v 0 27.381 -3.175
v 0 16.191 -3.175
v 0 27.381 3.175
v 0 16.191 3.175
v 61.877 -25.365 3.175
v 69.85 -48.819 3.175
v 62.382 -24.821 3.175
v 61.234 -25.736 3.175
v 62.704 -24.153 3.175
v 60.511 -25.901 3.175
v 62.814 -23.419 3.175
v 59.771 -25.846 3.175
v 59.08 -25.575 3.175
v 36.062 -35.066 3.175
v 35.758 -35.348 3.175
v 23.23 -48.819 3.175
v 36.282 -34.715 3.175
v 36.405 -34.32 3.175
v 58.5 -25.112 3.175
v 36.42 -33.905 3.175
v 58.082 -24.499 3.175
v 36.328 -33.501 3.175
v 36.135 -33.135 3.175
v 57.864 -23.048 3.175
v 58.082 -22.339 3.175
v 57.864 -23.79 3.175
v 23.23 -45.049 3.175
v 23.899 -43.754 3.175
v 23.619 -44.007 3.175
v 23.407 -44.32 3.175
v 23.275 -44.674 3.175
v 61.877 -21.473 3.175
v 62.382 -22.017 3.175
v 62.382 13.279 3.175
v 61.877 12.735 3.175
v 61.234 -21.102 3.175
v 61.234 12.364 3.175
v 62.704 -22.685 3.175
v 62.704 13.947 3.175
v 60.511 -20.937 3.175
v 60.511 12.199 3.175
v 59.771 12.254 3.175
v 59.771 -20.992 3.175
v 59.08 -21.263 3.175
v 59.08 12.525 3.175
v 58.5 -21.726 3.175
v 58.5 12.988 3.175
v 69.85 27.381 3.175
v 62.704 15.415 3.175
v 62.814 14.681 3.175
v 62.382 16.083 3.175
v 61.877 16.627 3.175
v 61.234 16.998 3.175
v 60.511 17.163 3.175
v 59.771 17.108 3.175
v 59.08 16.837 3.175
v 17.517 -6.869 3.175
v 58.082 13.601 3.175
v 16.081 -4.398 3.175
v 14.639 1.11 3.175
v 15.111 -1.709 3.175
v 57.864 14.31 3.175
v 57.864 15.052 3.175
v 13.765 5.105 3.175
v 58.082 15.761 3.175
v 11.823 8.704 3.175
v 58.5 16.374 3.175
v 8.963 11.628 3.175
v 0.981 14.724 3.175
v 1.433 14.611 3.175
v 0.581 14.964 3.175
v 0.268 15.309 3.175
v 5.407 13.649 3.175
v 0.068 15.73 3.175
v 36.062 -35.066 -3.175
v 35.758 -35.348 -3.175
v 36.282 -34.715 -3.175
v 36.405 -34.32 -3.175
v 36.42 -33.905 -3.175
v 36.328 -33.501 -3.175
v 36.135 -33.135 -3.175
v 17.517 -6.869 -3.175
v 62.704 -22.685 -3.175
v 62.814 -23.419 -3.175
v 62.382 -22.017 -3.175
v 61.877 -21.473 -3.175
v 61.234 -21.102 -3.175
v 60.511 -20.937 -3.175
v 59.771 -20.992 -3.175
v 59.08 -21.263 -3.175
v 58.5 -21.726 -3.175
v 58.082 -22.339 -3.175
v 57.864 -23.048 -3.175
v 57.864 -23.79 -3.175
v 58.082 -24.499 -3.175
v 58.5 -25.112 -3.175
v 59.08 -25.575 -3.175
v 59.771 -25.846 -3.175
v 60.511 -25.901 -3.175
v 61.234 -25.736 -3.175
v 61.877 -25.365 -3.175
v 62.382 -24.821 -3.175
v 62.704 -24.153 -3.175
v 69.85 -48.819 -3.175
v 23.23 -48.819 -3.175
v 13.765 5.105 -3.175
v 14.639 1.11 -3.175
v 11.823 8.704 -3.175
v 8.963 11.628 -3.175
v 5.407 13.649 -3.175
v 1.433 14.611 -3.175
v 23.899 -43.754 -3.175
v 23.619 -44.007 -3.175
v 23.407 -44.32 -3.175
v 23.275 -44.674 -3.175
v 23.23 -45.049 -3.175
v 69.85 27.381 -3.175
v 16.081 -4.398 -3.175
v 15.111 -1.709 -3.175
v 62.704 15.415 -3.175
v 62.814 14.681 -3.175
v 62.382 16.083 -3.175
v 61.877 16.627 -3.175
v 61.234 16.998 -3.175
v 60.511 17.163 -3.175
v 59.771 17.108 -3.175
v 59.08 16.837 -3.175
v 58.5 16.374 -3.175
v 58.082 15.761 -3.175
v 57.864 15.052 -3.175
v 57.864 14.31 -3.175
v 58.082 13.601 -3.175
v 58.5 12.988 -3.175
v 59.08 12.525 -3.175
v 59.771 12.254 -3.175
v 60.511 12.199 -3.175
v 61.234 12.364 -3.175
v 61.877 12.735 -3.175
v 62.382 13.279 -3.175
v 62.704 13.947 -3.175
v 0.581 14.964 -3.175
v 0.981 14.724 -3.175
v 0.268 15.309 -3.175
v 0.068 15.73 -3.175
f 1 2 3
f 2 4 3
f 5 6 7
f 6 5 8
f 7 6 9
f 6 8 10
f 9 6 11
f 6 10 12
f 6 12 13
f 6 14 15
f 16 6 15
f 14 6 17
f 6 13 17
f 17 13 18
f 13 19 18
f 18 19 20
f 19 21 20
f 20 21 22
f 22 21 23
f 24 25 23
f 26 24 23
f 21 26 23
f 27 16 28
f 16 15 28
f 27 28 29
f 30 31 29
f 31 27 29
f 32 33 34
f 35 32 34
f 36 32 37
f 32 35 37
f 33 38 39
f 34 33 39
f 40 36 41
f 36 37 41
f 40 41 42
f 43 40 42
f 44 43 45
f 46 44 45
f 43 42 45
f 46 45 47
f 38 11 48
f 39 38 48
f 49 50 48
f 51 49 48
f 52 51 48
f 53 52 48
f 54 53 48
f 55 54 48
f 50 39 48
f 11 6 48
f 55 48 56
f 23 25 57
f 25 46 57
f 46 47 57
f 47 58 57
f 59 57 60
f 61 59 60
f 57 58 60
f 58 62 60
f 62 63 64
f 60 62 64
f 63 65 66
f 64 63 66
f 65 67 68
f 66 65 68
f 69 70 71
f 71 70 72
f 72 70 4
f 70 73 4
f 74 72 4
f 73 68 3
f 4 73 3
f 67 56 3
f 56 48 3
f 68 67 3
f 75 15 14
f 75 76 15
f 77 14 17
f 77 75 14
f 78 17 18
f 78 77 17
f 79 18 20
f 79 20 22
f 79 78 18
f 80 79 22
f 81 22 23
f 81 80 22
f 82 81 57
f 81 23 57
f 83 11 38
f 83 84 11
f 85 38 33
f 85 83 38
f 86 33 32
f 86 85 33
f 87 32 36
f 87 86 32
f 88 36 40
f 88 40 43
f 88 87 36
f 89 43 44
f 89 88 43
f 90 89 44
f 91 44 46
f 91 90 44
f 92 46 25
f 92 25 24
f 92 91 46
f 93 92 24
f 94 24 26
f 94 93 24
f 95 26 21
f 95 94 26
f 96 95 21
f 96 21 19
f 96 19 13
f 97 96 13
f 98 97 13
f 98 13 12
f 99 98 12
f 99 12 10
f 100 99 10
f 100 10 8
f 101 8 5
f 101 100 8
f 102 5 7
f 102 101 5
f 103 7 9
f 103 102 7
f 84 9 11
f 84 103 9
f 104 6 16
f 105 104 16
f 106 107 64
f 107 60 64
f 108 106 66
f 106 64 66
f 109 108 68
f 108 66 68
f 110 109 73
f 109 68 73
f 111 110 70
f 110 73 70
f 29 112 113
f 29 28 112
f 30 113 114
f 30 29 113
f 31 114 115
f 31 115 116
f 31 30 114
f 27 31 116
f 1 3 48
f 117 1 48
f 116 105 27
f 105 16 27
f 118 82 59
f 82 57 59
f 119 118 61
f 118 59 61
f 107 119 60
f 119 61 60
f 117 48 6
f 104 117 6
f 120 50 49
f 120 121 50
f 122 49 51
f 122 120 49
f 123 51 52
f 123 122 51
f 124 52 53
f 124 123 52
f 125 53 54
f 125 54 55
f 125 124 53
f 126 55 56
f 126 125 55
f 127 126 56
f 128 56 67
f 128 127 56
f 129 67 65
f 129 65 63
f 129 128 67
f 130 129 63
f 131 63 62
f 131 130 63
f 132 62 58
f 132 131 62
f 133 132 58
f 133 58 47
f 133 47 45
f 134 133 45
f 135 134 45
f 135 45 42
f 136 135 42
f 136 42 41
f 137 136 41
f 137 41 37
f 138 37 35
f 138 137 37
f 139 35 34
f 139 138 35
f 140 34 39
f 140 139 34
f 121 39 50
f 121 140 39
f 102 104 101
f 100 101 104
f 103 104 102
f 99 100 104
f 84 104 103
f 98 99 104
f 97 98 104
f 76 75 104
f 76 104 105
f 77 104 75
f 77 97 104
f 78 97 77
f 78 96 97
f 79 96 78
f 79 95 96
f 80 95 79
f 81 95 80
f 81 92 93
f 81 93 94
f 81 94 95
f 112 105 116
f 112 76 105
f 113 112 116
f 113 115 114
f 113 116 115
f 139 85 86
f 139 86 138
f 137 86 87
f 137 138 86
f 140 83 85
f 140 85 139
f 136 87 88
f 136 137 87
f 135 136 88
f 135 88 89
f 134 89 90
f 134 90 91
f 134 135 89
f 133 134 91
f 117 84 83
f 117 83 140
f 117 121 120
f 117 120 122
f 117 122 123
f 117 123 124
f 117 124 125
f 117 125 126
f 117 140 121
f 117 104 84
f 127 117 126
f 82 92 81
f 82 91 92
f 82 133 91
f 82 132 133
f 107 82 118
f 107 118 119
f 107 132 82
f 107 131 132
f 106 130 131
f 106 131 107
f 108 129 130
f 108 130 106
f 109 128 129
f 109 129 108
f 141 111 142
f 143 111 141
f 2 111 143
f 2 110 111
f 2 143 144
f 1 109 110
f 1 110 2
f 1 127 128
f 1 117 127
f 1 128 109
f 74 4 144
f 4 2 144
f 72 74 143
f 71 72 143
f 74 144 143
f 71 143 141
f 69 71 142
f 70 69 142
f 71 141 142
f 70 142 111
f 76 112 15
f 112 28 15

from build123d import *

# Parameters (mm, degrees)
SKETCH1_R           = 2.4892
BOSS_EXTRUDE1_DEPTH = 3.175
FILLET1_R           = 1.5875


with BuildPart() as part:
    # Sketch1 → Boss-Extrude1 (new, symmetric)
    with BuildSketch(Plane.XY):
        with BuildLine():
            Line((23.229645255, -44.228270645), (37.052935248, -34.429965394))
            Line((37.052935248, -34.429965394), (17.517315641, -6.869430374))
            ThreePointArc((17.517315641, -6.869430374), (15.535368252, -3.075379389), (14.639156809, 1.110279863))
            ThreePointArc((14.639156809, 1.110279863), (9.980916609, 10.766565705), (0, 14.6812))
            Line((0, 14.6812), (0, 27.3812))
            Line((0, 27.3812), (69.85, 27.3812))
            Line((69.85, 27.3812), (69.85, -48.8188))
            Line((69.85, -48.8188), (23.229645255, -48.8188))
            Line((23.229645255, -48.8188), (23.229645255, -44.228270645))
        make_face()
        with Locations((60.325, 14.6812)):
            Circle(SKETCH1_R, mode=Mode.SUBTRACT)
        with Locations((60.325, -23.4188)):
            Circle(SKETCH1_R, mode=Mode.SUBTRACT)
    extrude(amount=BOSS_EXTRUDE1_DEPTH, both=True)

    # Fillet1
    fillet1_edges = [part.edges().sort_by_distance(p)[0] for p in [
        (0, 14.6812, 0),
        (23.229645255, -44.228270645, 0),
        (37.052935248, -34.429965394, 0),
    ]]
    fillet(fillet1_edges, radius=FILLET1_R)


solid = part.part
